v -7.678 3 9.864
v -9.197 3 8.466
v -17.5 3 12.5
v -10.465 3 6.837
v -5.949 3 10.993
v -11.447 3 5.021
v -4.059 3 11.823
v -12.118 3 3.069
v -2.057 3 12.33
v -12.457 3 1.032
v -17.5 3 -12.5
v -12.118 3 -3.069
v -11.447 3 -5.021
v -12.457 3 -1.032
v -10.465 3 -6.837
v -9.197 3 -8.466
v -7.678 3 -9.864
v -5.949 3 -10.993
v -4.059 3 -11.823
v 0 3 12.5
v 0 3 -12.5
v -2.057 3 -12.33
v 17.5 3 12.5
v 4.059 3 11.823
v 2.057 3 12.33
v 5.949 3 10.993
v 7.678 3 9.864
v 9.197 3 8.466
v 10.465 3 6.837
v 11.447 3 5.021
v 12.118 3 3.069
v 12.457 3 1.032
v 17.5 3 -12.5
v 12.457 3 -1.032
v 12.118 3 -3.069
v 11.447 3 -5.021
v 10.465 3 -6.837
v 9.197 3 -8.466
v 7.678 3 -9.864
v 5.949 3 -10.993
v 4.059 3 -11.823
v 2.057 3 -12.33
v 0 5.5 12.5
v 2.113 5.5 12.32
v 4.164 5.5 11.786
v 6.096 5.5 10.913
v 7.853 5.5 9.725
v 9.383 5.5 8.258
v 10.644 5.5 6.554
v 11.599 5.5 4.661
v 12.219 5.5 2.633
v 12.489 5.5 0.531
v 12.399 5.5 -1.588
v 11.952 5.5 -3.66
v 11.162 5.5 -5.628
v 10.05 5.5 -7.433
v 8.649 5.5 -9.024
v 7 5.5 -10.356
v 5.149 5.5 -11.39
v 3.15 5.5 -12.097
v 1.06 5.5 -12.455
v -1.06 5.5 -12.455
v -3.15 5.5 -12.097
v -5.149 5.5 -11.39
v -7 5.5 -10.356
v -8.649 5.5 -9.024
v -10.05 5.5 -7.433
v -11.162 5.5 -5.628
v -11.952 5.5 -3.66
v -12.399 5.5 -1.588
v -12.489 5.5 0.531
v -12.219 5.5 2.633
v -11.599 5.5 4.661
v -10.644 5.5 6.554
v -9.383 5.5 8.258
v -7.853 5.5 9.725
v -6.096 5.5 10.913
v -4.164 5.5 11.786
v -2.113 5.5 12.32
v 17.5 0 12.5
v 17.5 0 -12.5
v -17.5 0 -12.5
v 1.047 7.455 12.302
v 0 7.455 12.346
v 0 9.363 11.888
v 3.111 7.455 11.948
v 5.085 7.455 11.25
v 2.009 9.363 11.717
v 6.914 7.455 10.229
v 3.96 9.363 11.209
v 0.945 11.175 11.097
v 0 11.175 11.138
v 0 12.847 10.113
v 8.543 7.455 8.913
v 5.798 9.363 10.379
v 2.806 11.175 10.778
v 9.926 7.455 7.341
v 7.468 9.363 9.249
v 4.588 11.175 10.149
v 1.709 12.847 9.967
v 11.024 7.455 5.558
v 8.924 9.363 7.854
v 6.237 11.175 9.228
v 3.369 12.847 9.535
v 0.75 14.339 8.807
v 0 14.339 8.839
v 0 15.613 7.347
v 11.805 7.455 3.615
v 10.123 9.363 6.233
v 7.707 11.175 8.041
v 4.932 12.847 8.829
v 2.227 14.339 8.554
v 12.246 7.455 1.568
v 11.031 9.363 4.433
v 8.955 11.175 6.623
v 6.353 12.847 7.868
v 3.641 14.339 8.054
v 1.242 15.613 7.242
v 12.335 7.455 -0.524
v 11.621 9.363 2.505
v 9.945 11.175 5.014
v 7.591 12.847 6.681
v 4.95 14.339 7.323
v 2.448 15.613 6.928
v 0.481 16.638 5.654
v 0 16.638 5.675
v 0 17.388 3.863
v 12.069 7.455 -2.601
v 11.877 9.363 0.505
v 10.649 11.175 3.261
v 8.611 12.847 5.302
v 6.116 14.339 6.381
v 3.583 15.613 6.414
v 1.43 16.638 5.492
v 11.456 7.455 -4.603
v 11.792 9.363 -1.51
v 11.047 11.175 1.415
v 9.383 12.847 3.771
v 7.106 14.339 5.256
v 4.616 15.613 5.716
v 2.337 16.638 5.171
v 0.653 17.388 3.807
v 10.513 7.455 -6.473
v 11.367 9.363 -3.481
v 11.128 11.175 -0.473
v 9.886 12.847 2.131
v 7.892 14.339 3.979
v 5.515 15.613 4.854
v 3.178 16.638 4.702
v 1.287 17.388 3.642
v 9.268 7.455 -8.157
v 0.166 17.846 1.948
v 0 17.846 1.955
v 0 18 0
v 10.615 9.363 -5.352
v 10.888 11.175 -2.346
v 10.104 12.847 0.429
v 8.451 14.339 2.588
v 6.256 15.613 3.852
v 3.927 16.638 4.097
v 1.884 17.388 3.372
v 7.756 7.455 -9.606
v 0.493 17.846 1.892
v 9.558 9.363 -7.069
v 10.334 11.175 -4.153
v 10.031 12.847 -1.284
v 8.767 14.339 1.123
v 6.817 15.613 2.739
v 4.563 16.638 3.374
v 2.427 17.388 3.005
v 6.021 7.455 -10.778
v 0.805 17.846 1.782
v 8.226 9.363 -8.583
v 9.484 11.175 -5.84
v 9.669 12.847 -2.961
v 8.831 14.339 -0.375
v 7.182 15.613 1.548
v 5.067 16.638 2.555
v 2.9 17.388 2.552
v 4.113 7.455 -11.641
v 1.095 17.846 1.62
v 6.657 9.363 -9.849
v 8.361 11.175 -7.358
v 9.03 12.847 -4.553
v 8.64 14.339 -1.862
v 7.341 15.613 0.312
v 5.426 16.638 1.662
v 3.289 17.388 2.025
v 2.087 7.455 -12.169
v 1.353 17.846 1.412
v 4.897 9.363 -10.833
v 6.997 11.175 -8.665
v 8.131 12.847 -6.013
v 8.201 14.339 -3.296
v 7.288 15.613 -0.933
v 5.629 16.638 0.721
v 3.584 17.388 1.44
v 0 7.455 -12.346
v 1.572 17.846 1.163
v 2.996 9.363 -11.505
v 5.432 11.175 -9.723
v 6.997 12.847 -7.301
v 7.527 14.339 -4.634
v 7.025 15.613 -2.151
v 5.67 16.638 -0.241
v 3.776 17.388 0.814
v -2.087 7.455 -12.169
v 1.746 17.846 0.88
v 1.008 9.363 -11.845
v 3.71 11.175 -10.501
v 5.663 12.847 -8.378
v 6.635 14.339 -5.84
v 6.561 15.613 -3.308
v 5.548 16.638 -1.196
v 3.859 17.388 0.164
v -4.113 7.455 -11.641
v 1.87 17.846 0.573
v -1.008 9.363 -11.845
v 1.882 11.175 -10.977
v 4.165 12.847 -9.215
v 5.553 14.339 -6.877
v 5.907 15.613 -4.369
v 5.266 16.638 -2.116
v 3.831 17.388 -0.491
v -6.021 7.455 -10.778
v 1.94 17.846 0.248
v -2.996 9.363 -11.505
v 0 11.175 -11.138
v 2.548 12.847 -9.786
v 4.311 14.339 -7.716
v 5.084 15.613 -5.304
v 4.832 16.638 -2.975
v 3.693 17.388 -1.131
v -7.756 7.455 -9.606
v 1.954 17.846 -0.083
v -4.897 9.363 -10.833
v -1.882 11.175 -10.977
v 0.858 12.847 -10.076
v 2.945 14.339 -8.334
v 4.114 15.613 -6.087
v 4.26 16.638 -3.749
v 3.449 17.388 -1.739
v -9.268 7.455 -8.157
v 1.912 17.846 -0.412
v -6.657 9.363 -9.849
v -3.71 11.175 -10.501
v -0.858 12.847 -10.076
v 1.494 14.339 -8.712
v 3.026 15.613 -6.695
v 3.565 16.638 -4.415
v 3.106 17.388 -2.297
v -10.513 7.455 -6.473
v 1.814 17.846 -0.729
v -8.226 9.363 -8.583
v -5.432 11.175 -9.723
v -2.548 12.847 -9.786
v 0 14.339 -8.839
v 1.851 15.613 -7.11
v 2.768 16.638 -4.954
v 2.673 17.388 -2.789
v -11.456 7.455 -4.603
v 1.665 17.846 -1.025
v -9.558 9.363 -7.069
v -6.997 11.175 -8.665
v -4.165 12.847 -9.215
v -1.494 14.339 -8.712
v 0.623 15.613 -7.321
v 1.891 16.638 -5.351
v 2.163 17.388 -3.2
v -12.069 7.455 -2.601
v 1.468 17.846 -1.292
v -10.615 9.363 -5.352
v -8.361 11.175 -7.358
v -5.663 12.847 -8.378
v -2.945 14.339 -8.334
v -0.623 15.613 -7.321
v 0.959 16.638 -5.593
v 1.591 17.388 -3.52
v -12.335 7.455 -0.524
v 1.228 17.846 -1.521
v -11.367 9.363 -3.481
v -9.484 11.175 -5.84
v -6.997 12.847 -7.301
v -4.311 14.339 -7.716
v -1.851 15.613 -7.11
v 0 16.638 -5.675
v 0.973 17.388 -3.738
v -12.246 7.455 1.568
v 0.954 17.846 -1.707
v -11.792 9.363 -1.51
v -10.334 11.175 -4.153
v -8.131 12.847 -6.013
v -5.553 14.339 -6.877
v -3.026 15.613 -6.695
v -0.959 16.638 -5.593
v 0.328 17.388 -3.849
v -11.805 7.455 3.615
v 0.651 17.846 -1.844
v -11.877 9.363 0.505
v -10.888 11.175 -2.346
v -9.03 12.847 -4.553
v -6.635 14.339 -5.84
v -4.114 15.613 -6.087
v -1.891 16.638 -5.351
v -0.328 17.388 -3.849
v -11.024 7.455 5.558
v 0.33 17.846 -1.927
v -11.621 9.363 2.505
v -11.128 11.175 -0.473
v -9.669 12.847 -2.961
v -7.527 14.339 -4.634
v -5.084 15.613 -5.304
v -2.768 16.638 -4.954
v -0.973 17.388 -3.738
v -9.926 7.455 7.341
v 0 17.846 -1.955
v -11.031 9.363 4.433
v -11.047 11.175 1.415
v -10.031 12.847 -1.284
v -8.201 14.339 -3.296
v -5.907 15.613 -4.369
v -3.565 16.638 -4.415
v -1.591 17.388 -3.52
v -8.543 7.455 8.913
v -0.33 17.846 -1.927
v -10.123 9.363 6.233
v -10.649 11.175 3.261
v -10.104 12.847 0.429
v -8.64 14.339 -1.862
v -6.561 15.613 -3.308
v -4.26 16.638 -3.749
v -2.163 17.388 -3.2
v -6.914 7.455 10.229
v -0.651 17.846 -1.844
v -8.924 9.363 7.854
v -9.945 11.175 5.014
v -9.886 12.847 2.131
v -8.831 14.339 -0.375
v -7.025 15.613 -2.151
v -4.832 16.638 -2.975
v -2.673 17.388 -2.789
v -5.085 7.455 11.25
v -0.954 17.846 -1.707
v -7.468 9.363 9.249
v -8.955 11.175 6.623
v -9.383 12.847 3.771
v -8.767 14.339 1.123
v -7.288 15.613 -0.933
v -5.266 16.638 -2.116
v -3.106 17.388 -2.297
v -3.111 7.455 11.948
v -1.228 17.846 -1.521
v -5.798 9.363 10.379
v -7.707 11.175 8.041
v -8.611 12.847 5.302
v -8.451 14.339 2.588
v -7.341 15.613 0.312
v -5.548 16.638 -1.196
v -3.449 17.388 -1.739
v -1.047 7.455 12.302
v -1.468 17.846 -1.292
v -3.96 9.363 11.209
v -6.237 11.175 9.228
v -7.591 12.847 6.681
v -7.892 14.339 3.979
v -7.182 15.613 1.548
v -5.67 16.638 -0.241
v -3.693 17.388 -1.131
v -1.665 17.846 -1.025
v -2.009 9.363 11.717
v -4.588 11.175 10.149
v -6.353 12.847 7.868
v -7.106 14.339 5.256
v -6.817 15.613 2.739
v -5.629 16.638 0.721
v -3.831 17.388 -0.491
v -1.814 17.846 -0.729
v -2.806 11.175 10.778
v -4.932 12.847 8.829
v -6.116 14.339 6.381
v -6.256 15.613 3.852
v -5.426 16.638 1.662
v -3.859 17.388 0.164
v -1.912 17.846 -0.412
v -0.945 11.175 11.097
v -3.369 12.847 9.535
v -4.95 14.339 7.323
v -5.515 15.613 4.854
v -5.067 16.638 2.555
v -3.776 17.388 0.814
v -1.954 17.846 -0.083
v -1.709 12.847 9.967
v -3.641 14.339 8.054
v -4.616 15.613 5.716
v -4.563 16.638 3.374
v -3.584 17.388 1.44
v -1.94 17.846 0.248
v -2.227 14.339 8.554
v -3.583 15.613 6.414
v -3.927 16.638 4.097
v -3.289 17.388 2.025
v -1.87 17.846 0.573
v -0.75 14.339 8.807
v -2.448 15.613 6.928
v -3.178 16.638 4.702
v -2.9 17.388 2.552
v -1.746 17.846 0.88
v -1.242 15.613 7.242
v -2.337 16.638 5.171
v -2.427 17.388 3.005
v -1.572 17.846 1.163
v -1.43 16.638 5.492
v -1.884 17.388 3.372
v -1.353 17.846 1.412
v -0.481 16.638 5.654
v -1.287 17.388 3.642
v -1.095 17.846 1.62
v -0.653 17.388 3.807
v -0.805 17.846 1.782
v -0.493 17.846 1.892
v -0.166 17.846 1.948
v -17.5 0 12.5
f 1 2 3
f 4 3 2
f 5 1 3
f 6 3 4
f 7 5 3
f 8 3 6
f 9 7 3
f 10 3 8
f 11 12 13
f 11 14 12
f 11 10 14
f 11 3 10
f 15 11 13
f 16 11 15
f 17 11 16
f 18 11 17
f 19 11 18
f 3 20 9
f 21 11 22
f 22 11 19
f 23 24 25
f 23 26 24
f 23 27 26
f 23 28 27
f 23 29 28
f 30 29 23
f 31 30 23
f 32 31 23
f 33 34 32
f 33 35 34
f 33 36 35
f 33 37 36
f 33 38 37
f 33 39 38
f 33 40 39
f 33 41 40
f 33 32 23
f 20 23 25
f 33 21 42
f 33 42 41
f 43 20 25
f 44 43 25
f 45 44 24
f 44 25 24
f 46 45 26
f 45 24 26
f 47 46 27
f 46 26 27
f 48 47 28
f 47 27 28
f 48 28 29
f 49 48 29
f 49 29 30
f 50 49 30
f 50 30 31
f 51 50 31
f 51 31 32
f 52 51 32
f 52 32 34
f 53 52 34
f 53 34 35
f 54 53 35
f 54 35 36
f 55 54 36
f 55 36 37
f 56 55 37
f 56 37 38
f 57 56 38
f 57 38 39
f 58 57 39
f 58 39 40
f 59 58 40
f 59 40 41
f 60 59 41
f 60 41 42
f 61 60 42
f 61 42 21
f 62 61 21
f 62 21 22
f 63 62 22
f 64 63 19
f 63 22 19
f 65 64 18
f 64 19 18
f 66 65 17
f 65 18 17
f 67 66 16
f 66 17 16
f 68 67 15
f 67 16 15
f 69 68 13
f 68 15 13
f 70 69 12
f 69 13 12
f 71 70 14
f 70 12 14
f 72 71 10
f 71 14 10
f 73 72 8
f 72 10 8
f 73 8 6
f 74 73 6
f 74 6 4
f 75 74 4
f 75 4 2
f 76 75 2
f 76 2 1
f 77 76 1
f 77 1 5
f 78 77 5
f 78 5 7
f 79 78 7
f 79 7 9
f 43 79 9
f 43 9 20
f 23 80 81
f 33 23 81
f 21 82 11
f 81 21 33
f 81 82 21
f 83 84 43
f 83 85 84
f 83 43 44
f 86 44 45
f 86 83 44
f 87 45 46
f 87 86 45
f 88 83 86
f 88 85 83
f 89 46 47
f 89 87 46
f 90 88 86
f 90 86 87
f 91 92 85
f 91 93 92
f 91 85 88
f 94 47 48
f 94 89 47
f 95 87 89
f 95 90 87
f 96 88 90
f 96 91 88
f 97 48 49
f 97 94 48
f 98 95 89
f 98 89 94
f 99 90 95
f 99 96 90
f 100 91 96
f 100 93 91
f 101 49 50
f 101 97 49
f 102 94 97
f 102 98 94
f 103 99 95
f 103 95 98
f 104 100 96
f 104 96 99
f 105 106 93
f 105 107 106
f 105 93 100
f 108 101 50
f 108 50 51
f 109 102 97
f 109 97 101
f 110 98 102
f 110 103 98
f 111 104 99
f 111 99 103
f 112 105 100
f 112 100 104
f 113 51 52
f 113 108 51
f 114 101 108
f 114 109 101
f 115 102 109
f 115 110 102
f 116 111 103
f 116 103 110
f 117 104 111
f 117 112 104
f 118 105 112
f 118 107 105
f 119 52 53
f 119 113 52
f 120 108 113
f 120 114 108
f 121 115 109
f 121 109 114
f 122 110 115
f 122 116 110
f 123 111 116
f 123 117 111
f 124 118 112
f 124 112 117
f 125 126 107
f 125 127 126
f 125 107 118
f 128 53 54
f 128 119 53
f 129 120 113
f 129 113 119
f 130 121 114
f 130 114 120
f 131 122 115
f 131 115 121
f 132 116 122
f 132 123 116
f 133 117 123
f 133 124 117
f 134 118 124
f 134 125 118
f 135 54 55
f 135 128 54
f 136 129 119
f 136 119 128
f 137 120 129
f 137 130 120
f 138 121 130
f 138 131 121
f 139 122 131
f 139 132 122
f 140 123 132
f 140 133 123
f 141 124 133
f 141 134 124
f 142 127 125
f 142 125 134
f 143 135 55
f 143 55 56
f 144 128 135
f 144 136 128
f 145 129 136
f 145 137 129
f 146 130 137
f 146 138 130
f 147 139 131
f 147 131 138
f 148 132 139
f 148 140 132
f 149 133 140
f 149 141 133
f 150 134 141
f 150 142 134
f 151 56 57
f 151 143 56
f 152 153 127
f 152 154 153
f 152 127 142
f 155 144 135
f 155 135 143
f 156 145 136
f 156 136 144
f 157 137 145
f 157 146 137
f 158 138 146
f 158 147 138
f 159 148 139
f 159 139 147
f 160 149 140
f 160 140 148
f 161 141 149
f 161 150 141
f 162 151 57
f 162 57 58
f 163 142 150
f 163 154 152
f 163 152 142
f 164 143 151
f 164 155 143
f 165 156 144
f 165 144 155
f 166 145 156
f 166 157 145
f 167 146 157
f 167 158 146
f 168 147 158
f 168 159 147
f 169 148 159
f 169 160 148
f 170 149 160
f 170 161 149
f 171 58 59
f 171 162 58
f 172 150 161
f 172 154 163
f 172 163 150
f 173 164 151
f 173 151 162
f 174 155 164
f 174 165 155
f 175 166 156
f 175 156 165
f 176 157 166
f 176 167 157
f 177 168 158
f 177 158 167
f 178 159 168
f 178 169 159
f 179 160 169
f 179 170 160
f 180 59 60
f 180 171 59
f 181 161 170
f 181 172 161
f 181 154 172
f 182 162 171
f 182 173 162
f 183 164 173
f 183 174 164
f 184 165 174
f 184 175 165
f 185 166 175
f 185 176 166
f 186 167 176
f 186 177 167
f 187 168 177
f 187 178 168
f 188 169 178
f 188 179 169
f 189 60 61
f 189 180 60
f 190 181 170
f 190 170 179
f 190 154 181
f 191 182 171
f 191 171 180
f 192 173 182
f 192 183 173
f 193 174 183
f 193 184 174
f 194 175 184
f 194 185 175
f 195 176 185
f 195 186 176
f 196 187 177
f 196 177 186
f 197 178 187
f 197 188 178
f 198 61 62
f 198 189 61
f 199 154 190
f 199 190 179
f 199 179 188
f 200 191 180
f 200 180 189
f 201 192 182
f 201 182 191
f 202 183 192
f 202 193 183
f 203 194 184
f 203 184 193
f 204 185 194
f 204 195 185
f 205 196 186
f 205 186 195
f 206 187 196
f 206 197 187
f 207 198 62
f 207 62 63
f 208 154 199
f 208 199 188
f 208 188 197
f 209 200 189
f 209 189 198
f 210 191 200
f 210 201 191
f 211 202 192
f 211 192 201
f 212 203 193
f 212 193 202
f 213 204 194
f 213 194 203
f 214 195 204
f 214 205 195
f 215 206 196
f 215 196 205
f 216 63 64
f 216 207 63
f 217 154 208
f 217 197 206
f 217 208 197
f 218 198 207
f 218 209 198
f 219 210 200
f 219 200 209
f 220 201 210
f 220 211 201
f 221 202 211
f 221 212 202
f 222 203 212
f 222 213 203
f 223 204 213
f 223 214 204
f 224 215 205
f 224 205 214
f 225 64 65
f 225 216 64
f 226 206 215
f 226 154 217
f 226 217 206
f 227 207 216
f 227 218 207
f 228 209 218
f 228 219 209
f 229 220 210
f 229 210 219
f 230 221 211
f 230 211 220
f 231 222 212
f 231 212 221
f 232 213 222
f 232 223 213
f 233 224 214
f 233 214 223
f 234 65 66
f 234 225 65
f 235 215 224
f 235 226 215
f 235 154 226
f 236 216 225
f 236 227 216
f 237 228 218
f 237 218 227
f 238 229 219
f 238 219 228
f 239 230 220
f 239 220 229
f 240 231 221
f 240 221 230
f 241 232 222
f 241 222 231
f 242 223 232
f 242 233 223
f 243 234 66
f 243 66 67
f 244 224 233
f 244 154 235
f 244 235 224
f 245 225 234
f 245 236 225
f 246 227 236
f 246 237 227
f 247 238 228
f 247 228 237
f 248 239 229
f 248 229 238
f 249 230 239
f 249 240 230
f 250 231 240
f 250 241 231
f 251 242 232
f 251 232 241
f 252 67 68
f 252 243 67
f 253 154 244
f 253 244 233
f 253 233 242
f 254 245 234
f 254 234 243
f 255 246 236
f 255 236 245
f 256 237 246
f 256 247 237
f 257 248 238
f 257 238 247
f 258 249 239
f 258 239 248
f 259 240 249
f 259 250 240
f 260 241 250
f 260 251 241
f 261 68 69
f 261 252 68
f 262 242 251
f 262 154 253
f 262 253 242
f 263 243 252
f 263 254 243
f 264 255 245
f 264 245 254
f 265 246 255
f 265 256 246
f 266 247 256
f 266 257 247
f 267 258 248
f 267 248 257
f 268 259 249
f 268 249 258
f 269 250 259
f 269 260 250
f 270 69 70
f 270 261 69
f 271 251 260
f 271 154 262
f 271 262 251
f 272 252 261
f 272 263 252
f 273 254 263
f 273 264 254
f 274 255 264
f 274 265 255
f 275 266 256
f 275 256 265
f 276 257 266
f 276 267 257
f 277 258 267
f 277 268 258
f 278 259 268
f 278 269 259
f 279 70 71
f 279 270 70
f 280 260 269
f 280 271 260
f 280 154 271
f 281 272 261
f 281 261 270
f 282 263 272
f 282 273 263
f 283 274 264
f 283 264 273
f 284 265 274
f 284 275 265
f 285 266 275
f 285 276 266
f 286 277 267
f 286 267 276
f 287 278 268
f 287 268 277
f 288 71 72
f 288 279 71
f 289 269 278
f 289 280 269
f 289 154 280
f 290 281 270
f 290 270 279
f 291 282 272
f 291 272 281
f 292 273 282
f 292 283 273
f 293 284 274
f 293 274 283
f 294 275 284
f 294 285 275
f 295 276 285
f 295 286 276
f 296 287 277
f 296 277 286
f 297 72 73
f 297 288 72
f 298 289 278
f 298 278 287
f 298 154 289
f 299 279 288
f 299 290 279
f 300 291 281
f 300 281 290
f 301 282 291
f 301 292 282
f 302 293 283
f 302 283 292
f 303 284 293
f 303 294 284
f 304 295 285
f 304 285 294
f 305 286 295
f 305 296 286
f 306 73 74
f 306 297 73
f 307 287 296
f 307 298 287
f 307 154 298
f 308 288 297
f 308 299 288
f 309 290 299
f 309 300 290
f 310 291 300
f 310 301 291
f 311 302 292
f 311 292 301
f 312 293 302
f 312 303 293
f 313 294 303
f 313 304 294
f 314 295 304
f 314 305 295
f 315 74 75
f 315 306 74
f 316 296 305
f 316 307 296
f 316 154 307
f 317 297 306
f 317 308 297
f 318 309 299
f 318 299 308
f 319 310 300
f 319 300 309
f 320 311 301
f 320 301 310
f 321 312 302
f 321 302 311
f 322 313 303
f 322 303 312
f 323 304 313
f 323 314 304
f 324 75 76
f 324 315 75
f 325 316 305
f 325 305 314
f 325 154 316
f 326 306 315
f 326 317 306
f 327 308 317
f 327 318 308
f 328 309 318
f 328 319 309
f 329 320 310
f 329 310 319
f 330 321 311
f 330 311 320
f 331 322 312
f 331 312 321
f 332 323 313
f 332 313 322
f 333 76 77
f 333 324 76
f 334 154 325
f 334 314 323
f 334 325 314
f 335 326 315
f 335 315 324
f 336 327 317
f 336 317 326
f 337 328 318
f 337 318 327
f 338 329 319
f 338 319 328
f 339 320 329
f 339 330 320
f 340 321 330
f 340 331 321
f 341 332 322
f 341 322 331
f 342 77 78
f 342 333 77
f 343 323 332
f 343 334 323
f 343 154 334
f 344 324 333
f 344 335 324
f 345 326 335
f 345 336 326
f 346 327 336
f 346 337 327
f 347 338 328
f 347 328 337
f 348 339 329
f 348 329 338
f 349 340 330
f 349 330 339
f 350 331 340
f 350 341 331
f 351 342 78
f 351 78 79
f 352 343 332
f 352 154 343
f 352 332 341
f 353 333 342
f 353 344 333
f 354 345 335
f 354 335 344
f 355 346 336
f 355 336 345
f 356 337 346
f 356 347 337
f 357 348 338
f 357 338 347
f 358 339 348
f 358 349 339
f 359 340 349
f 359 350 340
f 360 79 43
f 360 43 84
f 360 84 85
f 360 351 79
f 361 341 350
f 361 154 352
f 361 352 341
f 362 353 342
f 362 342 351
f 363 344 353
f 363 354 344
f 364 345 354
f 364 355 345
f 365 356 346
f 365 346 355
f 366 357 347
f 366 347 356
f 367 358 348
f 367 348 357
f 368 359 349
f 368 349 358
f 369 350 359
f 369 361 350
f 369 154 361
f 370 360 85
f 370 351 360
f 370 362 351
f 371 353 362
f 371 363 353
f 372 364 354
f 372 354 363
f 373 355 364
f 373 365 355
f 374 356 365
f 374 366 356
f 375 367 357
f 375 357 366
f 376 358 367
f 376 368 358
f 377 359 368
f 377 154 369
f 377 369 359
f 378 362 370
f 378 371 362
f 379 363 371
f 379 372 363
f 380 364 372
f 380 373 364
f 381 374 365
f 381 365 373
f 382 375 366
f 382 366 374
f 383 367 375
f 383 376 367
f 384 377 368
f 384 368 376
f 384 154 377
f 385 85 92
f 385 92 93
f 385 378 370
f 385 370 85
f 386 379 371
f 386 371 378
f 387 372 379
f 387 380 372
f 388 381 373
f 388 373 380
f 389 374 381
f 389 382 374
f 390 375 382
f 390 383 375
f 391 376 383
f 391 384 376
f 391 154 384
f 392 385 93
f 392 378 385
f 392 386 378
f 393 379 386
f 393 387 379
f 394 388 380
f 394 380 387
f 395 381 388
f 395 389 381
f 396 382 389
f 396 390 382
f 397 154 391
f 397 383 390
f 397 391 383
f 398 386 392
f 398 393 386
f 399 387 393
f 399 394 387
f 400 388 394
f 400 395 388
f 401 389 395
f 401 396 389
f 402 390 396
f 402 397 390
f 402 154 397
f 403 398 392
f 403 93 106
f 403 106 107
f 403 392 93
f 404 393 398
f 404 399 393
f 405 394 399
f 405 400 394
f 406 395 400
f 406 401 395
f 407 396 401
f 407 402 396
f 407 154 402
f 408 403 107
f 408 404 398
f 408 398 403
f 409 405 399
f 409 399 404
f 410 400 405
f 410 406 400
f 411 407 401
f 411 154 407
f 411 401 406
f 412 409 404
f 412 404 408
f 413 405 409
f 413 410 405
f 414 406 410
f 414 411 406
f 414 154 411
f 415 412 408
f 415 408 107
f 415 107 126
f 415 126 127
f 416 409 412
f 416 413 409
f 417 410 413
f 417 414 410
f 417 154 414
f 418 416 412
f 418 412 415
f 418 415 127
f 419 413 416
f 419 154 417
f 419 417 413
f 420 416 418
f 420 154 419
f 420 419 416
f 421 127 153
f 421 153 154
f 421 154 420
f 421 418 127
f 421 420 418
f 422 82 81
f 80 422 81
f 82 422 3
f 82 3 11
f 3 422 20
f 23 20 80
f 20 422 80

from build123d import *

# Parameters (mm, degrees)
CROQUIS3_W              = 35
CROQUIS3_H              = 25
SALIENTE_EXTRUIR1_DEPTH = 3
CROQUIS4_R              = 12.5
SALIENTE_EXTRUIR2_DEPTH = 15
REDONDEO1_R             = 12.5


with BuildPart() as part:
    # Croquis3 → Saliente-Extruir1 (new body)
    with BuildSketch(Plane(origin=(0, 0, 0), x_dir=(1, 0, 0), z_dir=(0, 1, 0))):
        Rectangle(CROQUIS3_W, CROQUIS3_H)
    extrude(amount=SALIENTE_EXTRUIR1_DEPTH)

    # Croquis4 → Saliente-Extruir2 (add)
    with BuildSketch(Plane(origin=(0, 3, 0), x_dir=(1, 0, 0), z_dir=(0, 1, 0))):
        with Locations(Location((0, 0, 0), (0, 0, 270))):
            Circle(CROQUIS4_R)
    extrude(amount=SALIENTE_EXTRUIR2_DEPTH)

    # Redondeo1
    redondeo1_edges = [part.edges().sort_by_distance(p)[0] for p in [
        (0, 18, -12.5),
    ]]
    fillet(redondeo1_edges, radius=REDONDEO1_R)


solid = part.part
